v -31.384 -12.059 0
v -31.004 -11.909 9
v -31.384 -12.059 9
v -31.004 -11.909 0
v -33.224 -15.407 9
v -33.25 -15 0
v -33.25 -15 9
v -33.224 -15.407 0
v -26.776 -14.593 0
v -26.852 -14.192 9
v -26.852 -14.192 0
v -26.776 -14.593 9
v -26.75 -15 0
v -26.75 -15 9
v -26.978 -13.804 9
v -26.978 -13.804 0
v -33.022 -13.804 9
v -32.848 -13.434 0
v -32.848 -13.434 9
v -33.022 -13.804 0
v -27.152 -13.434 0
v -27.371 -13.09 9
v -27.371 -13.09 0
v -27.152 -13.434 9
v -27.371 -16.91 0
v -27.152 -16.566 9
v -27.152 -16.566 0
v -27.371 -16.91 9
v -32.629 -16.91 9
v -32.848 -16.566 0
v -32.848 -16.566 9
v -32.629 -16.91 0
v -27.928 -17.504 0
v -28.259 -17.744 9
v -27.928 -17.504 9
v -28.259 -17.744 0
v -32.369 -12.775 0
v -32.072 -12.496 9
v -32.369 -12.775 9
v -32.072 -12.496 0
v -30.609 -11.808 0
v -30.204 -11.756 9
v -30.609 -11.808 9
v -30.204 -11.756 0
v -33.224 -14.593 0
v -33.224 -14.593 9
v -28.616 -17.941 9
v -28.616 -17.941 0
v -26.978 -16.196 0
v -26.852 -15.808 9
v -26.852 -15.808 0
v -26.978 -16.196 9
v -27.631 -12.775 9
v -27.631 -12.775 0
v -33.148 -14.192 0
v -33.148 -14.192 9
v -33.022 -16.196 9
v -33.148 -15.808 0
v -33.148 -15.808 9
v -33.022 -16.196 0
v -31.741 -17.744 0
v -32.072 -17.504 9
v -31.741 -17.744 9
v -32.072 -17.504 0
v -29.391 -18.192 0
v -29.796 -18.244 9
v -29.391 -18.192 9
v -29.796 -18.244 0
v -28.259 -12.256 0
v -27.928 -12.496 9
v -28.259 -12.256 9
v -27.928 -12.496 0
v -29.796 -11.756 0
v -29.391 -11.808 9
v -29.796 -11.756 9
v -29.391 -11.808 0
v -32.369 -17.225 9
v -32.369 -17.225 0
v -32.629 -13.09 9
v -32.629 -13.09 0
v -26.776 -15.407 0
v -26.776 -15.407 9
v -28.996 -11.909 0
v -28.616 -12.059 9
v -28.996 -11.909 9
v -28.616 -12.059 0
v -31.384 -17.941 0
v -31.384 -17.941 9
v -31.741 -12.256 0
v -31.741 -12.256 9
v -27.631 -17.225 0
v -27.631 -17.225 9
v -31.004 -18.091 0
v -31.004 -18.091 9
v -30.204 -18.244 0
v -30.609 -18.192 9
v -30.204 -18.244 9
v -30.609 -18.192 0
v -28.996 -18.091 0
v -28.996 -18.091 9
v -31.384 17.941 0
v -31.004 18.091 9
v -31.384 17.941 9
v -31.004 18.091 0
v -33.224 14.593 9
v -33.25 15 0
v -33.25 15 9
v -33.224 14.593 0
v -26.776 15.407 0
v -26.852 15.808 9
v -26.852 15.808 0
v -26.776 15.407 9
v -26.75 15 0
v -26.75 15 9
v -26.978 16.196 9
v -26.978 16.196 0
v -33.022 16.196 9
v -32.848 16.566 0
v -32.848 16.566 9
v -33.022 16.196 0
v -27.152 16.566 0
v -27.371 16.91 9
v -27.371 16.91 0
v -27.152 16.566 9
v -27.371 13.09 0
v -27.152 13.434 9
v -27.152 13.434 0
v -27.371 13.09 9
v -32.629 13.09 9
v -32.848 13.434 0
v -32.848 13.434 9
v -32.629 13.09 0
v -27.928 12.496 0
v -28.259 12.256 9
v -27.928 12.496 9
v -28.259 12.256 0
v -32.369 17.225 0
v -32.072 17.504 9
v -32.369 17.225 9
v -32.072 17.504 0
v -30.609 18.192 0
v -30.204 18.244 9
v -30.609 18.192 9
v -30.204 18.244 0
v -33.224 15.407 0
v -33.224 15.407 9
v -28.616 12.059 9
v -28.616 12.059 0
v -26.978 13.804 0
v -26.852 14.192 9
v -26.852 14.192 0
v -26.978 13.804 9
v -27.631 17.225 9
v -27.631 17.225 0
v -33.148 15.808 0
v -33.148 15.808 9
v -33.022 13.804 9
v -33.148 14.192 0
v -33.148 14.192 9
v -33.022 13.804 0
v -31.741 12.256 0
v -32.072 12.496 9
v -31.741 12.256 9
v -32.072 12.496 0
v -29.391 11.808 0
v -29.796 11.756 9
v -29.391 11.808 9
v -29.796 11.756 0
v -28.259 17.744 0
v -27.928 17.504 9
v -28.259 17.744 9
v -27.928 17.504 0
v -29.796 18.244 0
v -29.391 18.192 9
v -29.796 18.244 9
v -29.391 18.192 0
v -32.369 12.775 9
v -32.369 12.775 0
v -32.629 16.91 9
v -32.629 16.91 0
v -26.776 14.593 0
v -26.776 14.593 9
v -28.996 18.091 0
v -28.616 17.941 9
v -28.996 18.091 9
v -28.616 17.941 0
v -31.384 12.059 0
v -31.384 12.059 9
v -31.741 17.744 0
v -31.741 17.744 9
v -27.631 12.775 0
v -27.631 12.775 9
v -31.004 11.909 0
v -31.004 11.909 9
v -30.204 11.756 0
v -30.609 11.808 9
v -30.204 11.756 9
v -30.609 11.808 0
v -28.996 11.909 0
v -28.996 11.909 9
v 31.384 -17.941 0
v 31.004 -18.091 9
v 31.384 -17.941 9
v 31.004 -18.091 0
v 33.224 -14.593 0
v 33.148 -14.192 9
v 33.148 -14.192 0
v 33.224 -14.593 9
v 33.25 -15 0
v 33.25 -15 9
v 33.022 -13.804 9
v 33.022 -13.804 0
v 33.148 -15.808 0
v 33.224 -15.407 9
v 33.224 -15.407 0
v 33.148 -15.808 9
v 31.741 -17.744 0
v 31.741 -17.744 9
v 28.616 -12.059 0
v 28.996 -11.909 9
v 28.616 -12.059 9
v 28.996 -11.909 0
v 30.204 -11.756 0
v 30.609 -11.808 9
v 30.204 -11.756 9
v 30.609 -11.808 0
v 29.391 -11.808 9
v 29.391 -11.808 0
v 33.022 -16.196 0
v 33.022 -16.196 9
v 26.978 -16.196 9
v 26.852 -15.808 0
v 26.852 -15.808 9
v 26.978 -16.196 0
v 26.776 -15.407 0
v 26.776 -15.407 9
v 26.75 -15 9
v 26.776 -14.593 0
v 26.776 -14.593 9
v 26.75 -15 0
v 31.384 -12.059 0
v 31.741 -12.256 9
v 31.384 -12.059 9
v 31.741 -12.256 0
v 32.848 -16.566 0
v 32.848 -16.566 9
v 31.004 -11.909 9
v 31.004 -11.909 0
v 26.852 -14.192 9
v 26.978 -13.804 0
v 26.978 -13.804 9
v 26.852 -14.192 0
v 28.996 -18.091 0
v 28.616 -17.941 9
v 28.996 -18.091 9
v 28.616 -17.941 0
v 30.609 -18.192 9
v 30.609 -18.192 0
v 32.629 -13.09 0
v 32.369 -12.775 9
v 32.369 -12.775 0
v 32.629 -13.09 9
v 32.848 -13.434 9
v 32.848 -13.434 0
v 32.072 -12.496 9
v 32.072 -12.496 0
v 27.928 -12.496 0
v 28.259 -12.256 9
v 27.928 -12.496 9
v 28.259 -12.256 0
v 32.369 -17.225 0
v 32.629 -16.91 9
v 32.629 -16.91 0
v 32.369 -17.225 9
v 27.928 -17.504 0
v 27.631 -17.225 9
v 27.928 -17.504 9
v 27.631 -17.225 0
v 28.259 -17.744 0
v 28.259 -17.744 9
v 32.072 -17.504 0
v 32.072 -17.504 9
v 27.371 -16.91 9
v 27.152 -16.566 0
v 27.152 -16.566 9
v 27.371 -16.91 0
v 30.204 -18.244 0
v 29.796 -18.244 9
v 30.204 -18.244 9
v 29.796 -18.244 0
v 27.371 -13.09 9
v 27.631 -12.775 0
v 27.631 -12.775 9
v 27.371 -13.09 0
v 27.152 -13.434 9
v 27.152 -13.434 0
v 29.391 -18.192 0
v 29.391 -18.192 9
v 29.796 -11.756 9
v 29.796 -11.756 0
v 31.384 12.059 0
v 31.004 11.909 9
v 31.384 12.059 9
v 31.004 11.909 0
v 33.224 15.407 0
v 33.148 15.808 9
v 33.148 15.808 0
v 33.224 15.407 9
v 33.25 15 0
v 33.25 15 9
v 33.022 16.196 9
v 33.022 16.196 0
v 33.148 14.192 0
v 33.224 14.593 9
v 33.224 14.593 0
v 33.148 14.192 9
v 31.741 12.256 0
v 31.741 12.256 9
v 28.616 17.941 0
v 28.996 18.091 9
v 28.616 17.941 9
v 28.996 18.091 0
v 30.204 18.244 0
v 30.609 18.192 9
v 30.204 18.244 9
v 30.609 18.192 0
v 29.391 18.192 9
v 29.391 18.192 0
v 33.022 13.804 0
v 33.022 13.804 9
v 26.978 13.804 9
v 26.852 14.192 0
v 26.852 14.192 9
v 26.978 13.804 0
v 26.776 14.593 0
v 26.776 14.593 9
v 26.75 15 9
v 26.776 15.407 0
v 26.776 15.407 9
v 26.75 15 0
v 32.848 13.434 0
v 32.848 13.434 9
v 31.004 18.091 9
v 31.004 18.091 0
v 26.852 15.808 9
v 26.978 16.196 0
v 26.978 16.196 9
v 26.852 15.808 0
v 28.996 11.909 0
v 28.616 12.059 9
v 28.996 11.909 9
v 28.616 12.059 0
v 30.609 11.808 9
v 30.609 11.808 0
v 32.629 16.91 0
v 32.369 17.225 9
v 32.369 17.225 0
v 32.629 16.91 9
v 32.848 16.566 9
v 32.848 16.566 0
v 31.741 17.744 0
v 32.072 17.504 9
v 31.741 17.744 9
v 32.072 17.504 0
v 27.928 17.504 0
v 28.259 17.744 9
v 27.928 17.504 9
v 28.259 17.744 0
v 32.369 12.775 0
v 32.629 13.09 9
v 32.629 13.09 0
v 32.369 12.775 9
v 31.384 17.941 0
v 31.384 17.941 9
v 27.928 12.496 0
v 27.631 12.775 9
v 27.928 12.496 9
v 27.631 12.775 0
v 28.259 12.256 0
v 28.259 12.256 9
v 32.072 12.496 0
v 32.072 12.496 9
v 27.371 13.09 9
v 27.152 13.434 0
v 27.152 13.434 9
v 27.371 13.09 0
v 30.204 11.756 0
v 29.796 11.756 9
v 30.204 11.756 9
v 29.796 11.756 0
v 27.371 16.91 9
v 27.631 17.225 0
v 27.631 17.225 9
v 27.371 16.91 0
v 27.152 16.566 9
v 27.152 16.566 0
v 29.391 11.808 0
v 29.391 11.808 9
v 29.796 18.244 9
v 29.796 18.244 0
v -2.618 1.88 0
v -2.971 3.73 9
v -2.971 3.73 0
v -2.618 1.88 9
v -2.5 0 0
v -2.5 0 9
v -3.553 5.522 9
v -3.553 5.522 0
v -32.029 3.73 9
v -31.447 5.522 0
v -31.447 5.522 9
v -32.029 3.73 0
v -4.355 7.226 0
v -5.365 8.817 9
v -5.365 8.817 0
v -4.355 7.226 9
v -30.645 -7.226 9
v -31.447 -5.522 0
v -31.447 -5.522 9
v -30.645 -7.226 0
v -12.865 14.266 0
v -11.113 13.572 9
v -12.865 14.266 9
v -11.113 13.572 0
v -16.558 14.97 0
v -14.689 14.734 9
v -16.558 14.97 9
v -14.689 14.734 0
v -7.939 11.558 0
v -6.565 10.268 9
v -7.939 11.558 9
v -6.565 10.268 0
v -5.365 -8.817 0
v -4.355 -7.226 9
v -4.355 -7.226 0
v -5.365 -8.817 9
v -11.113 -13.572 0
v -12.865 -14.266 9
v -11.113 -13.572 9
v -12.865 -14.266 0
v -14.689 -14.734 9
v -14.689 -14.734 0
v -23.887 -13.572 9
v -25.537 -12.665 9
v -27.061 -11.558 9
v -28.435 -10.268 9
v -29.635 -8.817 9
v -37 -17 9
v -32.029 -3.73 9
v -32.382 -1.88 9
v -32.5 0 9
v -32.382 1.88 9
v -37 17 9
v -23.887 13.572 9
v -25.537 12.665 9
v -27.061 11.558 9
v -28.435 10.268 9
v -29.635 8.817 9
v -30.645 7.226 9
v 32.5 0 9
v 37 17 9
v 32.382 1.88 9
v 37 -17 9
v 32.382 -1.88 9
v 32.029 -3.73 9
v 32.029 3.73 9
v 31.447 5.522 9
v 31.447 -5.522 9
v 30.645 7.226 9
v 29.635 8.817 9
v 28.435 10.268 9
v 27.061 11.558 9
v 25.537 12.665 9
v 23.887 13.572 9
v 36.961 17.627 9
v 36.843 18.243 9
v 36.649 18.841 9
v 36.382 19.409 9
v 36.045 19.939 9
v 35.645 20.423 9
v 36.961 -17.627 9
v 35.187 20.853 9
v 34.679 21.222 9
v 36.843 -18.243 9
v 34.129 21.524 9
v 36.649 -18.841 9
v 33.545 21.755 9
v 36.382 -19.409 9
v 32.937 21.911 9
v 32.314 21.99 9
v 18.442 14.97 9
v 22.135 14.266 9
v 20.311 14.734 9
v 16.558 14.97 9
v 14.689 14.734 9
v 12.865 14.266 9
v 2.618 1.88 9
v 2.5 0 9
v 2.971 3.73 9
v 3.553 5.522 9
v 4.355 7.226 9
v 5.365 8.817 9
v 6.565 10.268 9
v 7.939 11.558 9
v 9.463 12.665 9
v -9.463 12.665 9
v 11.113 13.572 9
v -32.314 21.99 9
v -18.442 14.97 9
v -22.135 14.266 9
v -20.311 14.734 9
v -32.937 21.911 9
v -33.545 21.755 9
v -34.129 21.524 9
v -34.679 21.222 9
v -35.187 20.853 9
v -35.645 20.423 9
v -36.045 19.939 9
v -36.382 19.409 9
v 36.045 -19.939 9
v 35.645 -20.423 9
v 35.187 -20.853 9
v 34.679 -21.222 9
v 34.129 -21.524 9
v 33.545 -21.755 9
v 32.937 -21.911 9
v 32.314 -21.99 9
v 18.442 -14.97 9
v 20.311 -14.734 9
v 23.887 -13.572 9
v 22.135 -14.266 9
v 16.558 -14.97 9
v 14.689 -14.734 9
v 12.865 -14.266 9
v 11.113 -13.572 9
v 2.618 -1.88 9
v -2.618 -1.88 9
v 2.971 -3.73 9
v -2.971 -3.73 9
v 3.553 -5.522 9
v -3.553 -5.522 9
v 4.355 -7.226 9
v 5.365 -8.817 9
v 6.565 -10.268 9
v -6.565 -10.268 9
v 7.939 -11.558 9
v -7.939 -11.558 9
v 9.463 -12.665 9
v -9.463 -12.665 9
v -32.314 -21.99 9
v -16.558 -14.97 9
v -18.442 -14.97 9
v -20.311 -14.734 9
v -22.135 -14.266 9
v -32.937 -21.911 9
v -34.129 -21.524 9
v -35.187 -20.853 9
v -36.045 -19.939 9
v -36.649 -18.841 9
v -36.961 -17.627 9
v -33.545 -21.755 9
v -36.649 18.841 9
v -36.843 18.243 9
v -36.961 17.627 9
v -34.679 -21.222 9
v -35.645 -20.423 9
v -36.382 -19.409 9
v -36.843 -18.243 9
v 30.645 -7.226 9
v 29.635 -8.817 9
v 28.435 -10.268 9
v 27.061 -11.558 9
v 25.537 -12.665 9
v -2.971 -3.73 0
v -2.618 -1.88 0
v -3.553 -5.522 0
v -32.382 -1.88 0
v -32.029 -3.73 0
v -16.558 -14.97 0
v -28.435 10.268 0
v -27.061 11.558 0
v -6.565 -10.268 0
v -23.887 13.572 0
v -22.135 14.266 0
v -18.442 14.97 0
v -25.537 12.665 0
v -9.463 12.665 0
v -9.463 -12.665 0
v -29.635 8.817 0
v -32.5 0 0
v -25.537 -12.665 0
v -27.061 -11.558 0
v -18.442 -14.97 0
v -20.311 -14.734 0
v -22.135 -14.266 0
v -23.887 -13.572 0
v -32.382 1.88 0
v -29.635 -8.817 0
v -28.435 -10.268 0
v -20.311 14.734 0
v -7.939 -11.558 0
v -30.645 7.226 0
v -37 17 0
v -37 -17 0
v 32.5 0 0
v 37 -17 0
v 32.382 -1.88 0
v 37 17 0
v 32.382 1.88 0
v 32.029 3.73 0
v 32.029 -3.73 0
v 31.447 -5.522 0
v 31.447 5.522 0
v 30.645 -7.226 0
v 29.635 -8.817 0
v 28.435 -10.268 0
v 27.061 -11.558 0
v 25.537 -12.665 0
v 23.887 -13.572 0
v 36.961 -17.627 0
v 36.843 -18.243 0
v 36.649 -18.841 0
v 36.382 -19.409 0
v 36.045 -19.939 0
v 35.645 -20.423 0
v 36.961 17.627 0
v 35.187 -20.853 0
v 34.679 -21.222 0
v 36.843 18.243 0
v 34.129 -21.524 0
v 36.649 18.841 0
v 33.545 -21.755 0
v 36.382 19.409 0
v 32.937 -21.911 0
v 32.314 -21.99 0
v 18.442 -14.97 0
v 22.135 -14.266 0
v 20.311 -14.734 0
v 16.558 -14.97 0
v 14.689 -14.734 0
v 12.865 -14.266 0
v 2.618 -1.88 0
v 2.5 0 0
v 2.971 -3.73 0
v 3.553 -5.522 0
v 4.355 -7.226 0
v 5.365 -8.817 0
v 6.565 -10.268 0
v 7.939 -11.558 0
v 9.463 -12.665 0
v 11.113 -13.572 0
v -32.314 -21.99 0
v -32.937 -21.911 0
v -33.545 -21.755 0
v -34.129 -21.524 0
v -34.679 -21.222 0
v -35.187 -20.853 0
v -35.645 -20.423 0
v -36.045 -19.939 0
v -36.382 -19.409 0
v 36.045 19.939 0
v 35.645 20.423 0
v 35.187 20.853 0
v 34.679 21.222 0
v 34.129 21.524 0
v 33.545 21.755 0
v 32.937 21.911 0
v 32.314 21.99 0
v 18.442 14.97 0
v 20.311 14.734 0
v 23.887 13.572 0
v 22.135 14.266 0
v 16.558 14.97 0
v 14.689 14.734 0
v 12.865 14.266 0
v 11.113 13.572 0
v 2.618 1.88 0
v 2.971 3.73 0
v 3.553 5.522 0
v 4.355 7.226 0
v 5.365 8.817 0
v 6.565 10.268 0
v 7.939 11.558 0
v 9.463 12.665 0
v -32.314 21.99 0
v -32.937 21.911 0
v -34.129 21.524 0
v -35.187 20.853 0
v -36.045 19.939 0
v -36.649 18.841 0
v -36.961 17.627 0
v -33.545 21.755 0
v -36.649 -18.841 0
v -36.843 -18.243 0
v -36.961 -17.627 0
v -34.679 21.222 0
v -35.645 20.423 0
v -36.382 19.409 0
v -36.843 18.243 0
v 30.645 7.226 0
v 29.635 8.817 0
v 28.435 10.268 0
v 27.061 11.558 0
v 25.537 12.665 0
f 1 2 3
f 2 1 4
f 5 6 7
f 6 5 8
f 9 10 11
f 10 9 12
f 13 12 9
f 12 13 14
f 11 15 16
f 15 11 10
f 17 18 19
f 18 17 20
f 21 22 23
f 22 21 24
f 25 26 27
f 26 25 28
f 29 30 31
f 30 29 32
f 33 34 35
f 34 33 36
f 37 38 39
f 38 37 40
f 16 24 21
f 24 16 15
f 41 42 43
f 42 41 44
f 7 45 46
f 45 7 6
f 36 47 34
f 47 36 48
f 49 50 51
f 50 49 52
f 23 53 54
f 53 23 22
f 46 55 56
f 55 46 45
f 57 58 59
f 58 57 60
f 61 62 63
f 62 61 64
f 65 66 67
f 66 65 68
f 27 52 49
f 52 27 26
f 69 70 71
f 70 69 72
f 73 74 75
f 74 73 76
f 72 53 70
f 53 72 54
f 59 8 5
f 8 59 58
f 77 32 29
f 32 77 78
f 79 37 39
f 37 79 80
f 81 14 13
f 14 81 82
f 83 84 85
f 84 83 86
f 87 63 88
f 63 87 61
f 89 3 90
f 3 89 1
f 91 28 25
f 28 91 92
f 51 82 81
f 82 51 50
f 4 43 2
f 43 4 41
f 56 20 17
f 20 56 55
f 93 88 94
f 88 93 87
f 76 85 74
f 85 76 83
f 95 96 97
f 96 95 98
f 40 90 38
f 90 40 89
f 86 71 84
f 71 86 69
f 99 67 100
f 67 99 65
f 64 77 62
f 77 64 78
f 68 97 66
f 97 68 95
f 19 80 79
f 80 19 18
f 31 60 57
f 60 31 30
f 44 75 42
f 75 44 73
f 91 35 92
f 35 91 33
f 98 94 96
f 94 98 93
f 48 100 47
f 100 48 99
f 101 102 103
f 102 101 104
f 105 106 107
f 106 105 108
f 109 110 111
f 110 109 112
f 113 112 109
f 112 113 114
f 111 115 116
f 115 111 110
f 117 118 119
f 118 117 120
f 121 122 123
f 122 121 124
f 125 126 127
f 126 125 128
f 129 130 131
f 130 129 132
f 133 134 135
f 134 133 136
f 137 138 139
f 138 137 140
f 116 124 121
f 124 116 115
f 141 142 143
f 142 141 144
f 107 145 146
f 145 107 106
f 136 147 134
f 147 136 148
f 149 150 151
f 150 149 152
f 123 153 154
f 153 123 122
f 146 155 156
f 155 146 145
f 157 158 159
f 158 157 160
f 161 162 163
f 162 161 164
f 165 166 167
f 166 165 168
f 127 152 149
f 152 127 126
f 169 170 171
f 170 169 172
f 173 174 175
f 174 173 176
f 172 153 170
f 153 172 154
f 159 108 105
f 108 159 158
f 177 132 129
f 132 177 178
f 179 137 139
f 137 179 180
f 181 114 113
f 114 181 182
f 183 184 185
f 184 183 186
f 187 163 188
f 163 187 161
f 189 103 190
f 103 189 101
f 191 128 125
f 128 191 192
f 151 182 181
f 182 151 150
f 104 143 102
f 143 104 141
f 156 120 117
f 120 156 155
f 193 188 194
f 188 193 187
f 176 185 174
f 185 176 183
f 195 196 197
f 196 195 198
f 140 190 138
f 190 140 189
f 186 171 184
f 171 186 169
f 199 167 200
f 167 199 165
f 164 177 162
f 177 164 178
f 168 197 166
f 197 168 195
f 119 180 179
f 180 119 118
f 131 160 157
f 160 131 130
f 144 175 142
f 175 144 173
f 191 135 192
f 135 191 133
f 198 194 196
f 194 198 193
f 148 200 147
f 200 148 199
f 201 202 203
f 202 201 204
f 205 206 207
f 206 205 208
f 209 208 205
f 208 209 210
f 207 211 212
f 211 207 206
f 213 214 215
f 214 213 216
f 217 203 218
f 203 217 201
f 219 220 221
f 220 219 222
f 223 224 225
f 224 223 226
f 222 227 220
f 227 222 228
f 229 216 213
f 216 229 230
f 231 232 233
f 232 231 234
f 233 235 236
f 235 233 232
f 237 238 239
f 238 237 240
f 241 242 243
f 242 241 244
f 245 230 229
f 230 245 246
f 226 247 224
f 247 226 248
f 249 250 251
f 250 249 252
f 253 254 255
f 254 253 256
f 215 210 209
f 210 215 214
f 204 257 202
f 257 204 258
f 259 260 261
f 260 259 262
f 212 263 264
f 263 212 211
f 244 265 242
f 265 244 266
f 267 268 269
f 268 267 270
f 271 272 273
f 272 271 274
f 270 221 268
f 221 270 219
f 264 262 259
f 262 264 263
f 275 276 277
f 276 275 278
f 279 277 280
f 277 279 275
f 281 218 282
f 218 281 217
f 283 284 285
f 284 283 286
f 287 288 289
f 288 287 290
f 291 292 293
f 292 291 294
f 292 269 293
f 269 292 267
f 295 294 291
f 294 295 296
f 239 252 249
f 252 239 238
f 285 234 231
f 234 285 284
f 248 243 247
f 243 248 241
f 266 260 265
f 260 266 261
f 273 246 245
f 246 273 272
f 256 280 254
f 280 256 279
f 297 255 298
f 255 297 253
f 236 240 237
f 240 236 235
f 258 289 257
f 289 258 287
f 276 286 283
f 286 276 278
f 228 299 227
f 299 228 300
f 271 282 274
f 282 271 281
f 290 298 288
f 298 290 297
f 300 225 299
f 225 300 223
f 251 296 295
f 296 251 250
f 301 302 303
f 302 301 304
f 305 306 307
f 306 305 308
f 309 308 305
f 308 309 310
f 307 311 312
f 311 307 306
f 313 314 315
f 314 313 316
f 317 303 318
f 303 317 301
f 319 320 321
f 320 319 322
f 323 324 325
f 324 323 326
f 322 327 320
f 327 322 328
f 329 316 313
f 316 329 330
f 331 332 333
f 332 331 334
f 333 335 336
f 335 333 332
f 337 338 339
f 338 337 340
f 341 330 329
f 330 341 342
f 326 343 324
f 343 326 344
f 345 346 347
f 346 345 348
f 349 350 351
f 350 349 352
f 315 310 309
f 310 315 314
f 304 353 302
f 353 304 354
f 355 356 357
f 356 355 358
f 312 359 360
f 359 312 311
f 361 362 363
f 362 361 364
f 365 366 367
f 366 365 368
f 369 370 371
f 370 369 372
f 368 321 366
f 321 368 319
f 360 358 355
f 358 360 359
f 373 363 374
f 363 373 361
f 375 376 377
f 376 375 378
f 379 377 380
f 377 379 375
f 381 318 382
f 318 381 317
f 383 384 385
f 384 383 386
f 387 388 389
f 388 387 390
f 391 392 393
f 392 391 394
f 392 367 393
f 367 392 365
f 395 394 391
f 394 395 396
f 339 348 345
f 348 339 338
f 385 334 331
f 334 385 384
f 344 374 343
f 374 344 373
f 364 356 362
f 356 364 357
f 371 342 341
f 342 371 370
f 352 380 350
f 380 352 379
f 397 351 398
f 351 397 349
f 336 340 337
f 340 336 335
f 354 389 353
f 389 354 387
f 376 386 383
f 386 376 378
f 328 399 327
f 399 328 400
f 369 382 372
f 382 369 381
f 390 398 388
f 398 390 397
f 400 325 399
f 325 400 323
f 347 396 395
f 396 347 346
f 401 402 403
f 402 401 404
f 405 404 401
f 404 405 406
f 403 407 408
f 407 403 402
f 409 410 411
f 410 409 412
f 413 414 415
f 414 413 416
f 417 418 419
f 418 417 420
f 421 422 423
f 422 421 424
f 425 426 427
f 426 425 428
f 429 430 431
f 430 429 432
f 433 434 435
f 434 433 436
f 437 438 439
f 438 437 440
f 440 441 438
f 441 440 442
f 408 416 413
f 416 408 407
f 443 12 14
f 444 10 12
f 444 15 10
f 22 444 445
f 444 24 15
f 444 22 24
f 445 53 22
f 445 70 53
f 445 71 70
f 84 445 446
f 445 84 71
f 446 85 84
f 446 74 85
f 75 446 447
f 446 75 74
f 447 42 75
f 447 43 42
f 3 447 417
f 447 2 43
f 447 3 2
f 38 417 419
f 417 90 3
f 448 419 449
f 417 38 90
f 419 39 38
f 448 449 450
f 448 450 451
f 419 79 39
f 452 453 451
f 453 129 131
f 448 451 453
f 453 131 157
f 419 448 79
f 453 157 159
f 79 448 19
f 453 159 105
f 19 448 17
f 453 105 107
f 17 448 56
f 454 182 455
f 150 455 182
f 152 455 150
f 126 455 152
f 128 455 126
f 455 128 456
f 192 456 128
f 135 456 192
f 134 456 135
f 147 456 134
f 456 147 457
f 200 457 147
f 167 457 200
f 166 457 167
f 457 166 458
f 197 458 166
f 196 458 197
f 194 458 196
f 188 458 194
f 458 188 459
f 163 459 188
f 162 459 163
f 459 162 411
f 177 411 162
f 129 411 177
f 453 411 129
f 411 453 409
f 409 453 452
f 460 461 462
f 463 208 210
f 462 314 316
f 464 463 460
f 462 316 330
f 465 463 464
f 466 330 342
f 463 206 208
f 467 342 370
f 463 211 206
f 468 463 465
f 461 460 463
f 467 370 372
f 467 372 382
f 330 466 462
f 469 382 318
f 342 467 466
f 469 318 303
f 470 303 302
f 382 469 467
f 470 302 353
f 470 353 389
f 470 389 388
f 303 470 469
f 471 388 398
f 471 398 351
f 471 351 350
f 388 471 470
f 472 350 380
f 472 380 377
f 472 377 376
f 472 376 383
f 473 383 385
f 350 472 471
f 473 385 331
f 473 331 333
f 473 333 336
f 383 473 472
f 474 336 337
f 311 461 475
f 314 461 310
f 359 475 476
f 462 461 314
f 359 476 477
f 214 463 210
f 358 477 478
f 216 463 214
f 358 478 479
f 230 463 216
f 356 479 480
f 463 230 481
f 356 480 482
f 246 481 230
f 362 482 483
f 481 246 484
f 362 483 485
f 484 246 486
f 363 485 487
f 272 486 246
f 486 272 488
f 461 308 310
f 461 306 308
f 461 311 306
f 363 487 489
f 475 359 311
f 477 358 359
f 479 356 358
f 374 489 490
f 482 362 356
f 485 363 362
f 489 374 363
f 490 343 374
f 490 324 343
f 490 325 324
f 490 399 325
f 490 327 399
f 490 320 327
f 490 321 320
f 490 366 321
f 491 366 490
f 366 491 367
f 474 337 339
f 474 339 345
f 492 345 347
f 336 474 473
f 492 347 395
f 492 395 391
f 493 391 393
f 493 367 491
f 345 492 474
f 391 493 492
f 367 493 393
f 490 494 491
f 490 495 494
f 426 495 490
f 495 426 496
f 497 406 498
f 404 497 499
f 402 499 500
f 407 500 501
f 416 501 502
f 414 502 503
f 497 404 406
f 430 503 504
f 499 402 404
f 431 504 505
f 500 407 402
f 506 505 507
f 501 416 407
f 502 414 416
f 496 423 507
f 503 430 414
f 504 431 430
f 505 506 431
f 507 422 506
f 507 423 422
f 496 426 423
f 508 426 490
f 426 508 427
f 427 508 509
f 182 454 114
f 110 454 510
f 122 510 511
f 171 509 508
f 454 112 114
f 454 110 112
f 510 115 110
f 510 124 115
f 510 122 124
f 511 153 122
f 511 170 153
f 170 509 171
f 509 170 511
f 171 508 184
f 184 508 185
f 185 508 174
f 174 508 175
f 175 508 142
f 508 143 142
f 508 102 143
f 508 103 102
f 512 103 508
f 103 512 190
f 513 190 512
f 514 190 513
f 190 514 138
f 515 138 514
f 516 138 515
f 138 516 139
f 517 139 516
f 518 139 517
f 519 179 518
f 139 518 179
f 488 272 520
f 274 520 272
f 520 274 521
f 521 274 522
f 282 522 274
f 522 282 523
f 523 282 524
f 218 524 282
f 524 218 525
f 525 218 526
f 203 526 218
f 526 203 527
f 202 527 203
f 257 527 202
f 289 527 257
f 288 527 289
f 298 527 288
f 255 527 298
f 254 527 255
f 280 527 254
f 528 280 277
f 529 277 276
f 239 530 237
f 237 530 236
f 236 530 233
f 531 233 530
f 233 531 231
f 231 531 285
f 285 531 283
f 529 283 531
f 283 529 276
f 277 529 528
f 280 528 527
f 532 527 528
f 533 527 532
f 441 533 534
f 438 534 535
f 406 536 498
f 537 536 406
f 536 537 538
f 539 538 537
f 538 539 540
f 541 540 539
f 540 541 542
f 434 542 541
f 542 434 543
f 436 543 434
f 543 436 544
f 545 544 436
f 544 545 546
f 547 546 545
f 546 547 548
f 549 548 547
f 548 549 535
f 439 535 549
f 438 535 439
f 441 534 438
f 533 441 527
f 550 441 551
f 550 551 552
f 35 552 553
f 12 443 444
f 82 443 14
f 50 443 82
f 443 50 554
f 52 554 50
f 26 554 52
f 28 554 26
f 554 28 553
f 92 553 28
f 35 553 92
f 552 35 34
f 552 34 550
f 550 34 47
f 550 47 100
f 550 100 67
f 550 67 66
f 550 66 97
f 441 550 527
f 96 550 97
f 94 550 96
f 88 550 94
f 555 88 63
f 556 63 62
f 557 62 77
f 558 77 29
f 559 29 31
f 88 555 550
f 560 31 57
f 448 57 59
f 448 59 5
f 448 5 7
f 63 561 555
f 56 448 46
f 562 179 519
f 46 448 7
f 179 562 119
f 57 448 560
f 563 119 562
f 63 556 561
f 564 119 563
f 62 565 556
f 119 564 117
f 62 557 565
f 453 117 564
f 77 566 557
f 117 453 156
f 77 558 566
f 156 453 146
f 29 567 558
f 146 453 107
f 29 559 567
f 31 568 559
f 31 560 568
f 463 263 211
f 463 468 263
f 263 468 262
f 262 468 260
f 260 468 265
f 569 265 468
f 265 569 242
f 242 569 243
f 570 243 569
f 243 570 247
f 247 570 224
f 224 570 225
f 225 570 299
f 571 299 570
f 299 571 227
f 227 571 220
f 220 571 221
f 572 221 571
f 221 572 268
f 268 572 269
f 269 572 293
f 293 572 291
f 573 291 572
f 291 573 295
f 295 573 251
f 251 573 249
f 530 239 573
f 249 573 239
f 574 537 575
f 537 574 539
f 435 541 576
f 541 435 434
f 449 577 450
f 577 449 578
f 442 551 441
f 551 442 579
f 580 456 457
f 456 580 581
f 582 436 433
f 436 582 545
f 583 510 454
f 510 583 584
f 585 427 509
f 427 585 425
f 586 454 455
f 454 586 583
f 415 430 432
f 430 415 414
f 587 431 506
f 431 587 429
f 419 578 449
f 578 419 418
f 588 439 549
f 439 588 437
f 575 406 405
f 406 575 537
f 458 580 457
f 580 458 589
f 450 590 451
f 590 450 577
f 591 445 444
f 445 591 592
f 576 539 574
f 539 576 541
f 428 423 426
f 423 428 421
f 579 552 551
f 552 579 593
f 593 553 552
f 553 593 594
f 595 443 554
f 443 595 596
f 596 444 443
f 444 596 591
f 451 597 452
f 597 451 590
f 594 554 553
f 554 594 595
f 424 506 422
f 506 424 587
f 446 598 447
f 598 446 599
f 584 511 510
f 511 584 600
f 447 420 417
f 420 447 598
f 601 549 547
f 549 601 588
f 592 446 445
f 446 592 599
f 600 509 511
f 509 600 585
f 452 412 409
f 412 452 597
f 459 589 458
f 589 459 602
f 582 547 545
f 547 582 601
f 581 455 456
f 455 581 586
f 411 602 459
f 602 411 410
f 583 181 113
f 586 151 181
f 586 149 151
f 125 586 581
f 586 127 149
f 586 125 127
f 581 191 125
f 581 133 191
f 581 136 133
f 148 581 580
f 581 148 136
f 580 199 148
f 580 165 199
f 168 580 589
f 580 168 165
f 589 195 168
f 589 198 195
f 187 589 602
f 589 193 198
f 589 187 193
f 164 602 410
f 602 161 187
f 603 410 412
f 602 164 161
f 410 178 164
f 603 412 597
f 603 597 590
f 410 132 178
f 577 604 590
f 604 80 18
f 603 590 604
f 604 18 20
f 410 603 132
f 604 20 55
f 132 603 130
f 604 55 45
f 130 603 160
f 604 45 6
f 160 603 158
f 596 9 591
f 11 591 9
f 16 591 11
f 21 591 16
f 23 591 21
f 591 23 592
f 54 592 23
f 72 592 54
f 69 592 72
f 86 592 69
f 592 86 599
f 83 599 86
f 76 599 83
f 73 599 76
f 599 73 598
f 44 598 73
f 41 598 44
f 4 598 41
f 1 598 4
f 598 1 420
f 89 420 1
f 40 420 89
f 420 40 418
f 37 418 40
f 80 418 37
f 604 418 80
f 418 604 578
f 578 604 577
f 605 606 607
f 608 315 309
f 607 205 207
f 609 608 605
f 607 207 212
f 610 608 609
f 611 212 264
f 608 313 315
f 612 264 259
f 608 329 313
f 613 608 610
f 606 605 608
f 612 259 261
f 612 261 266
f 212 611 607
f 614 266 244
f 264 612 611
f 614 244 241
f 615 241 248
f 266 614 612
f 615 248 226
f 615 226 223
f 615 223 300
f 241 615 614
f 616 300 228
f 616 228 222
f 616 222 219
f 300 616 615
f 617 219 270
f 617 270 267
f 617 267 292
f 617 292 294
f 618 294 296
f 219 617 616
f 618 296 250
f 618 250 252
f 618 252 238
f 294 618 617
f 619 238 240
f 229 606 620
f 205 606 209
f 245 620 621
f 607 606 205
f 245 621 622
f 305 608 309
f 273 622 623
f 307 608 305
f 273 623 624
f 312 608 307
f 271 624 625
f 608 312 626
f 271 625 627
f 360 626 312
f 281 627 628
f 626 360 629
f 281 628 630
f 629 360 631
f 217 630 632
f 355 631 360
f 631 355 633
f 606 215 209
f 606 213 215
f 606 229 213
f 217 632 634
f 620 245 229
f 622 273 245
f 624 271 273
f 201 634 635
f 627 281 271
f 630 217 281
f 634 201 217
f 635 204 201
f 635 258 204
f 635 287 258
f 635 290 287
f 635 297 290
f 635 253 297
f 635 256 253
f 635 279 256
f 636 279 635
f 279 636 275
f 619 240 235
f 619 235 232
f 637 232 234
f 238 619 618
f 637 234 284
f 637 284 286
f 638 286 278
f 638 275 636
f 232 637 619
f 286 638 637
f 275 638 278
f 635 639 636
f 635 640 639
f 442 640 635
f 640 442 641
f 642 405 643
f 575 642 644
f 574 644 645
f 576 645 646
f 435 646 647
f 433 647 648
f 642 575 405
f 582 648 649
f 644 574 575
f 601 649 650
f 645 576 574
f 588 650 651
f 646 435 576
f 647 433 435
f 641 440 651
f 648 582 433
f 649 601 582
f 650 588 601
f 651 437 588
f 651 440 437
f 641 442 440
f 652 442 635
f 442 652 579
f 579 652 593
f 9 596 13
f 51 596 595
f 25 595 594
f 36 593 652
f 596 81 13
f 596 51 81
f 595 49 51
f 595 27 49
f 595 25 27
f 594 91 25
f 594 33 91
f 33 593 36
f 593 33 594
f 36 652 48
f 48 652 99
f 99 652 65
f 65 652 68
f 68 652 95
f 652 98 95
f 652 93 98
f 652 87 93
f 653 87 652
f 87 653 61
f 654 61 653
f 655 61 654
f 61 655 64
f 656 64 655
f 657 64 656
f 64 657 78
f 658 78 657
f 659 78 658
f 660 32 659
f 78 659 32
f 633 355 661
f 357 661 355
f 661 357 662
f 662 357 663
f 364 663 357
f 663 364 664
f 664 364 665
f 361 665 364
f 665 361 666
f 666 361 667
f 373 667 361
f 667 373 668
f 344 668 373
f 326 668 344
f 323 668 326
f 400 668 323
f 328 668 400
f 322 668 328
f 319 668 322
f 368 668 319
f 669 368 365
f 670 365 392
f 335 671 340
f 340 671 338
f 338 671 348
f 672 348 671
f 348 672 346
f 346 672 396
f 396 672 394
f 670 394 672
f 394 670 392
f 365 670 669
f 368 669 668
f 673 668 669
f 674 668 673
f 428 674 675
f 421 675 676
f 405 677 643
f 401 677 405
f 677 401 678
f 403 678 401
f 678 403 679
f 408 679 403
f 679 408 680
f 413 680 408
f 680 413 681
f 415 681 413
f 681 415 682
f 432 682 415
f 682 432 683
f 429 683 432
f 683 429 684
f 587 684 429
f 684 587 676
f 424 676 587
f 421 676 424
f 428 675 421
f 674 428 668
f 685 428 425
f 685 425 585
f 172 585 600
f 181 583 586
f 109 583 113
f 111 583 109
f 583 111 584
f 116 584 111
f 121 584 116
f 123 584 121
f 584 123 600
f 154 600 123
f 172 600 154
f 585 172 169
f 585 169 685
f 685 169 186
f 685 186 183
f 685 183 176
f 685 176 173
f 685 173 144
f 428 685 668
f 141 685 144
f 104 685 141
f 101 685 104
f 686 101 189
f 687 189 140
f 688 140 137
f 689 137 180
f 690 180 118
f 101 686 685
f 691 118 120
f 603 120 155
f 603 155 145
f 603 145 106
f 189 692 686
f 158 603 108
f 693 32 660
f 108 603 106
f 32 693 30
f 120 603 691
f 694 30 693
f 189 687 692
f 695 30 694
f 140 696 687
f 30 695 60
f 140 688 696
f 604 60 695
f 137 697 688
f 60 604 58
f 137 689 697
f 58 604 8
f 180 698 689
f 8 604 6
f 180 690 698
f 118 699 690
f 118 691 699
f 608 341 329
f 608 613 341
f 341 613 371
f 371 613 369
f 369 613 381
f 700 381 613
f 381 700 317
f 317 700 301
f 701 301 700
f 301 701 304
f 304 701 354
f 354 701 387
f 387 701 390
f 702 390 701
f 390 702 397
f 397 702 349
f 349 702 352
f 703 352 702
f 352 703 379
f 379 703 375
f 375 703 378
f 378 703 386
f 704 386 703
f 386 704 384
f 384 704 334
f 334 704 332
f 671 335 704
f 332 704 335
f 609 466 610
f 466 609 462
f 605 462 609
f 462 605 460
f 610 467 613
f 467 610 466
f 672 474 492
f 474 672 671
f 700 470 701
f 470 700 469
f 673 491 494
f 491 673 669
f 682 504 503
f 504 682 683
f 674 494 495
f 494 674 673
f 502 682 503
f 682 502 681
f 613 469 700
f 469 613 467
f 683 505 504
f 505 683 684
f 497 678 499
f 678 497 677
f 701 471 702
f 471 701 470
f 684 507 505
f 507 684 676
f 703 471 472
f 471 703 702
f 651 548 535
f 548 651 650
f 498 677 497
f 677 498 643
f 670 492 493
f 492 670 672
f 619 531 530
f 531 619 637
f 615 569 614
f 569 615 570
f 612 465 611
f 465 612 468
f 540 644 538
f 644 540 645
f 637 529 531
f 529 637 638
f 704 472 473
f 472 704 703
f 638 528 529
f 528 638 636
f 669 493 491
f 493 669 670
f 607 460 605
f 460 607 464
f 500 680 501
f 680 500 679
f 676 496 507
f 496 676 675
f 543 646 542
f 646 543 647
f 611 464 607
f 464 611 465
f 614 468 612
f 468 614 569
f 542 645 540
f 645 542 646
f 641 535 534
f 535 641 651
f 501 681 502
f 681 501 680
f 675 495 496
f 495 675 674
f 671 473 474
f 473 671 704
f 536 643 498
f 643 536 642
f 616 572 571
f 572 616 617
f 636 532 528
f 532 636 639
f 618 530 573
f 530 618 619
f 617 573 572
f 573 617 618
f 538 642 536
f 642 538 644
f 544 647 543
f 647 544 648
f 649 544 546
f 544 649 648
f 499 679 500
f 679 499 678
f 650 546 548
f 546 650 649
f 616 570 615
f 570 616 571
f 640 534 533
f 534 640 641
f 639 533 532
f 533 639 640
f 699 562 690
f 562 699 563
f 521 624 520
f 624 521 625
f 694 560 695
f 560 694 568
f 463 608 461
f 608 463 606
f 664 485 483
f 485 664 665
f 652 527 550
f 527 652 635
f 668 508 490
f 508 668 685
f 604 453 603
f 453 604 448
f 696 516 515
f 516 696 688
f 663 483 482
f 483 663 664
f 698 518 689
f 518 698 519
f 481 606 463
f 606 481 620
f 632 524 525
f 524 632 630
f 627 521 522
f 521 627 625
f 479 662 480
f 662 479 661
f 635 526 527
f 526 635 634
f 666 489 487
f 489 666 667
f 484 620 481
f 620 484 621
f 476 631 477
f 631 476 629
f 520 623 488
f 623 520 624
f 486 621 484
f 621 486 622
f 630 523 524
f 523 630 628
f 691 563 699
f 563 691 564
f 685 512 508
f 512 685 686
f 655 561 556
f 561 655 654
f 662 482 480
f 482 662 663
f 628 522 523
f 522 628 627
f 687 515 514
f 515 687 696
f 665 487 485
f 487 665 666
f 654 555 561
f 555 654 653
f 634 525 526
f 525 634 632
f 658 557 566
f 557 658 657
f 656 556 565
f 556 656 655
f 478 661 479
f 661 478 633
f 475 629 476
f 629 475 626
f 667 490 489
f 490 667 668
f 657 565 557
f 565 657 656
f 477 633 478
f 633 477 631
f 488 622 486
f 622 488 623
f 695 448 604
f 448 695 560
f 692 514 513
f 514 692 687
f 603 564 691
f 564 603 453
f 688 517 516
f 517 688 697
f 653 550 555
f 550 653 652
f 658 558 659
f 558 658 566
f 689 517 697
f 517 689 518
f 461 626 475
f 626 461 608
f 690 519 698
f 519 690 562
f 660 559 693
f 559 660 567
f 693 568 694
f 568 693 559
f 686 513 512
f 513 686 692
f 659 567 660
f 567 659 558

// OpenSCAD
$fn = 50;


difference() {
	union() {
		hull() {
			translate(v = [-32.0000000000, 17.0000000000, 0]) {
				cylinder(h = 9, r = 5);
			}
			translate(v = [32.0000000000, 17.0000000000, 0]) {
				cylinder(h = 9, r = 5);
			}
			translate(v = [-32.0000000000, -17.0000000000, 0]) {
				cylinder(h = 9, r = 5);
			}
			translate(v = [32.0000000000, -17.0000000000, 0]) {
				cylinder(h = 9, r = 5);
			}
		}
	}
	union() {
		#translate(v = [-30.0000000000, -15.0000000000, -100.0000000000]) {
			cylinder(h = 200, r = 3.2500000000);
		}
		#translate(v = [-30.0000000000, 15.0000000000, -100.0000000000]) {
			cylinder(h = 200, r = 3.2500000000);
		}
		#translate(v = [30.0000000000, -15.0000000000, -100.0000000000]) {
			cylinder(h = 200, r = 3.2500000000);
		}
		#translate(v = [30.0000000000, 15.0000000000, -100.0000000000]) {
			cylinder(h = 200, r = 3.2500000000);
		}
		#translate(v = [-17.5000000000, 0, 0]) {
			cylinder(h = 9, r = 15.0000000000);
		}
		#translate(v = [17.5000000000, 0, 0]) {
			cylinder(h = 9, r = 15.0000000000);
		}
	}
}
